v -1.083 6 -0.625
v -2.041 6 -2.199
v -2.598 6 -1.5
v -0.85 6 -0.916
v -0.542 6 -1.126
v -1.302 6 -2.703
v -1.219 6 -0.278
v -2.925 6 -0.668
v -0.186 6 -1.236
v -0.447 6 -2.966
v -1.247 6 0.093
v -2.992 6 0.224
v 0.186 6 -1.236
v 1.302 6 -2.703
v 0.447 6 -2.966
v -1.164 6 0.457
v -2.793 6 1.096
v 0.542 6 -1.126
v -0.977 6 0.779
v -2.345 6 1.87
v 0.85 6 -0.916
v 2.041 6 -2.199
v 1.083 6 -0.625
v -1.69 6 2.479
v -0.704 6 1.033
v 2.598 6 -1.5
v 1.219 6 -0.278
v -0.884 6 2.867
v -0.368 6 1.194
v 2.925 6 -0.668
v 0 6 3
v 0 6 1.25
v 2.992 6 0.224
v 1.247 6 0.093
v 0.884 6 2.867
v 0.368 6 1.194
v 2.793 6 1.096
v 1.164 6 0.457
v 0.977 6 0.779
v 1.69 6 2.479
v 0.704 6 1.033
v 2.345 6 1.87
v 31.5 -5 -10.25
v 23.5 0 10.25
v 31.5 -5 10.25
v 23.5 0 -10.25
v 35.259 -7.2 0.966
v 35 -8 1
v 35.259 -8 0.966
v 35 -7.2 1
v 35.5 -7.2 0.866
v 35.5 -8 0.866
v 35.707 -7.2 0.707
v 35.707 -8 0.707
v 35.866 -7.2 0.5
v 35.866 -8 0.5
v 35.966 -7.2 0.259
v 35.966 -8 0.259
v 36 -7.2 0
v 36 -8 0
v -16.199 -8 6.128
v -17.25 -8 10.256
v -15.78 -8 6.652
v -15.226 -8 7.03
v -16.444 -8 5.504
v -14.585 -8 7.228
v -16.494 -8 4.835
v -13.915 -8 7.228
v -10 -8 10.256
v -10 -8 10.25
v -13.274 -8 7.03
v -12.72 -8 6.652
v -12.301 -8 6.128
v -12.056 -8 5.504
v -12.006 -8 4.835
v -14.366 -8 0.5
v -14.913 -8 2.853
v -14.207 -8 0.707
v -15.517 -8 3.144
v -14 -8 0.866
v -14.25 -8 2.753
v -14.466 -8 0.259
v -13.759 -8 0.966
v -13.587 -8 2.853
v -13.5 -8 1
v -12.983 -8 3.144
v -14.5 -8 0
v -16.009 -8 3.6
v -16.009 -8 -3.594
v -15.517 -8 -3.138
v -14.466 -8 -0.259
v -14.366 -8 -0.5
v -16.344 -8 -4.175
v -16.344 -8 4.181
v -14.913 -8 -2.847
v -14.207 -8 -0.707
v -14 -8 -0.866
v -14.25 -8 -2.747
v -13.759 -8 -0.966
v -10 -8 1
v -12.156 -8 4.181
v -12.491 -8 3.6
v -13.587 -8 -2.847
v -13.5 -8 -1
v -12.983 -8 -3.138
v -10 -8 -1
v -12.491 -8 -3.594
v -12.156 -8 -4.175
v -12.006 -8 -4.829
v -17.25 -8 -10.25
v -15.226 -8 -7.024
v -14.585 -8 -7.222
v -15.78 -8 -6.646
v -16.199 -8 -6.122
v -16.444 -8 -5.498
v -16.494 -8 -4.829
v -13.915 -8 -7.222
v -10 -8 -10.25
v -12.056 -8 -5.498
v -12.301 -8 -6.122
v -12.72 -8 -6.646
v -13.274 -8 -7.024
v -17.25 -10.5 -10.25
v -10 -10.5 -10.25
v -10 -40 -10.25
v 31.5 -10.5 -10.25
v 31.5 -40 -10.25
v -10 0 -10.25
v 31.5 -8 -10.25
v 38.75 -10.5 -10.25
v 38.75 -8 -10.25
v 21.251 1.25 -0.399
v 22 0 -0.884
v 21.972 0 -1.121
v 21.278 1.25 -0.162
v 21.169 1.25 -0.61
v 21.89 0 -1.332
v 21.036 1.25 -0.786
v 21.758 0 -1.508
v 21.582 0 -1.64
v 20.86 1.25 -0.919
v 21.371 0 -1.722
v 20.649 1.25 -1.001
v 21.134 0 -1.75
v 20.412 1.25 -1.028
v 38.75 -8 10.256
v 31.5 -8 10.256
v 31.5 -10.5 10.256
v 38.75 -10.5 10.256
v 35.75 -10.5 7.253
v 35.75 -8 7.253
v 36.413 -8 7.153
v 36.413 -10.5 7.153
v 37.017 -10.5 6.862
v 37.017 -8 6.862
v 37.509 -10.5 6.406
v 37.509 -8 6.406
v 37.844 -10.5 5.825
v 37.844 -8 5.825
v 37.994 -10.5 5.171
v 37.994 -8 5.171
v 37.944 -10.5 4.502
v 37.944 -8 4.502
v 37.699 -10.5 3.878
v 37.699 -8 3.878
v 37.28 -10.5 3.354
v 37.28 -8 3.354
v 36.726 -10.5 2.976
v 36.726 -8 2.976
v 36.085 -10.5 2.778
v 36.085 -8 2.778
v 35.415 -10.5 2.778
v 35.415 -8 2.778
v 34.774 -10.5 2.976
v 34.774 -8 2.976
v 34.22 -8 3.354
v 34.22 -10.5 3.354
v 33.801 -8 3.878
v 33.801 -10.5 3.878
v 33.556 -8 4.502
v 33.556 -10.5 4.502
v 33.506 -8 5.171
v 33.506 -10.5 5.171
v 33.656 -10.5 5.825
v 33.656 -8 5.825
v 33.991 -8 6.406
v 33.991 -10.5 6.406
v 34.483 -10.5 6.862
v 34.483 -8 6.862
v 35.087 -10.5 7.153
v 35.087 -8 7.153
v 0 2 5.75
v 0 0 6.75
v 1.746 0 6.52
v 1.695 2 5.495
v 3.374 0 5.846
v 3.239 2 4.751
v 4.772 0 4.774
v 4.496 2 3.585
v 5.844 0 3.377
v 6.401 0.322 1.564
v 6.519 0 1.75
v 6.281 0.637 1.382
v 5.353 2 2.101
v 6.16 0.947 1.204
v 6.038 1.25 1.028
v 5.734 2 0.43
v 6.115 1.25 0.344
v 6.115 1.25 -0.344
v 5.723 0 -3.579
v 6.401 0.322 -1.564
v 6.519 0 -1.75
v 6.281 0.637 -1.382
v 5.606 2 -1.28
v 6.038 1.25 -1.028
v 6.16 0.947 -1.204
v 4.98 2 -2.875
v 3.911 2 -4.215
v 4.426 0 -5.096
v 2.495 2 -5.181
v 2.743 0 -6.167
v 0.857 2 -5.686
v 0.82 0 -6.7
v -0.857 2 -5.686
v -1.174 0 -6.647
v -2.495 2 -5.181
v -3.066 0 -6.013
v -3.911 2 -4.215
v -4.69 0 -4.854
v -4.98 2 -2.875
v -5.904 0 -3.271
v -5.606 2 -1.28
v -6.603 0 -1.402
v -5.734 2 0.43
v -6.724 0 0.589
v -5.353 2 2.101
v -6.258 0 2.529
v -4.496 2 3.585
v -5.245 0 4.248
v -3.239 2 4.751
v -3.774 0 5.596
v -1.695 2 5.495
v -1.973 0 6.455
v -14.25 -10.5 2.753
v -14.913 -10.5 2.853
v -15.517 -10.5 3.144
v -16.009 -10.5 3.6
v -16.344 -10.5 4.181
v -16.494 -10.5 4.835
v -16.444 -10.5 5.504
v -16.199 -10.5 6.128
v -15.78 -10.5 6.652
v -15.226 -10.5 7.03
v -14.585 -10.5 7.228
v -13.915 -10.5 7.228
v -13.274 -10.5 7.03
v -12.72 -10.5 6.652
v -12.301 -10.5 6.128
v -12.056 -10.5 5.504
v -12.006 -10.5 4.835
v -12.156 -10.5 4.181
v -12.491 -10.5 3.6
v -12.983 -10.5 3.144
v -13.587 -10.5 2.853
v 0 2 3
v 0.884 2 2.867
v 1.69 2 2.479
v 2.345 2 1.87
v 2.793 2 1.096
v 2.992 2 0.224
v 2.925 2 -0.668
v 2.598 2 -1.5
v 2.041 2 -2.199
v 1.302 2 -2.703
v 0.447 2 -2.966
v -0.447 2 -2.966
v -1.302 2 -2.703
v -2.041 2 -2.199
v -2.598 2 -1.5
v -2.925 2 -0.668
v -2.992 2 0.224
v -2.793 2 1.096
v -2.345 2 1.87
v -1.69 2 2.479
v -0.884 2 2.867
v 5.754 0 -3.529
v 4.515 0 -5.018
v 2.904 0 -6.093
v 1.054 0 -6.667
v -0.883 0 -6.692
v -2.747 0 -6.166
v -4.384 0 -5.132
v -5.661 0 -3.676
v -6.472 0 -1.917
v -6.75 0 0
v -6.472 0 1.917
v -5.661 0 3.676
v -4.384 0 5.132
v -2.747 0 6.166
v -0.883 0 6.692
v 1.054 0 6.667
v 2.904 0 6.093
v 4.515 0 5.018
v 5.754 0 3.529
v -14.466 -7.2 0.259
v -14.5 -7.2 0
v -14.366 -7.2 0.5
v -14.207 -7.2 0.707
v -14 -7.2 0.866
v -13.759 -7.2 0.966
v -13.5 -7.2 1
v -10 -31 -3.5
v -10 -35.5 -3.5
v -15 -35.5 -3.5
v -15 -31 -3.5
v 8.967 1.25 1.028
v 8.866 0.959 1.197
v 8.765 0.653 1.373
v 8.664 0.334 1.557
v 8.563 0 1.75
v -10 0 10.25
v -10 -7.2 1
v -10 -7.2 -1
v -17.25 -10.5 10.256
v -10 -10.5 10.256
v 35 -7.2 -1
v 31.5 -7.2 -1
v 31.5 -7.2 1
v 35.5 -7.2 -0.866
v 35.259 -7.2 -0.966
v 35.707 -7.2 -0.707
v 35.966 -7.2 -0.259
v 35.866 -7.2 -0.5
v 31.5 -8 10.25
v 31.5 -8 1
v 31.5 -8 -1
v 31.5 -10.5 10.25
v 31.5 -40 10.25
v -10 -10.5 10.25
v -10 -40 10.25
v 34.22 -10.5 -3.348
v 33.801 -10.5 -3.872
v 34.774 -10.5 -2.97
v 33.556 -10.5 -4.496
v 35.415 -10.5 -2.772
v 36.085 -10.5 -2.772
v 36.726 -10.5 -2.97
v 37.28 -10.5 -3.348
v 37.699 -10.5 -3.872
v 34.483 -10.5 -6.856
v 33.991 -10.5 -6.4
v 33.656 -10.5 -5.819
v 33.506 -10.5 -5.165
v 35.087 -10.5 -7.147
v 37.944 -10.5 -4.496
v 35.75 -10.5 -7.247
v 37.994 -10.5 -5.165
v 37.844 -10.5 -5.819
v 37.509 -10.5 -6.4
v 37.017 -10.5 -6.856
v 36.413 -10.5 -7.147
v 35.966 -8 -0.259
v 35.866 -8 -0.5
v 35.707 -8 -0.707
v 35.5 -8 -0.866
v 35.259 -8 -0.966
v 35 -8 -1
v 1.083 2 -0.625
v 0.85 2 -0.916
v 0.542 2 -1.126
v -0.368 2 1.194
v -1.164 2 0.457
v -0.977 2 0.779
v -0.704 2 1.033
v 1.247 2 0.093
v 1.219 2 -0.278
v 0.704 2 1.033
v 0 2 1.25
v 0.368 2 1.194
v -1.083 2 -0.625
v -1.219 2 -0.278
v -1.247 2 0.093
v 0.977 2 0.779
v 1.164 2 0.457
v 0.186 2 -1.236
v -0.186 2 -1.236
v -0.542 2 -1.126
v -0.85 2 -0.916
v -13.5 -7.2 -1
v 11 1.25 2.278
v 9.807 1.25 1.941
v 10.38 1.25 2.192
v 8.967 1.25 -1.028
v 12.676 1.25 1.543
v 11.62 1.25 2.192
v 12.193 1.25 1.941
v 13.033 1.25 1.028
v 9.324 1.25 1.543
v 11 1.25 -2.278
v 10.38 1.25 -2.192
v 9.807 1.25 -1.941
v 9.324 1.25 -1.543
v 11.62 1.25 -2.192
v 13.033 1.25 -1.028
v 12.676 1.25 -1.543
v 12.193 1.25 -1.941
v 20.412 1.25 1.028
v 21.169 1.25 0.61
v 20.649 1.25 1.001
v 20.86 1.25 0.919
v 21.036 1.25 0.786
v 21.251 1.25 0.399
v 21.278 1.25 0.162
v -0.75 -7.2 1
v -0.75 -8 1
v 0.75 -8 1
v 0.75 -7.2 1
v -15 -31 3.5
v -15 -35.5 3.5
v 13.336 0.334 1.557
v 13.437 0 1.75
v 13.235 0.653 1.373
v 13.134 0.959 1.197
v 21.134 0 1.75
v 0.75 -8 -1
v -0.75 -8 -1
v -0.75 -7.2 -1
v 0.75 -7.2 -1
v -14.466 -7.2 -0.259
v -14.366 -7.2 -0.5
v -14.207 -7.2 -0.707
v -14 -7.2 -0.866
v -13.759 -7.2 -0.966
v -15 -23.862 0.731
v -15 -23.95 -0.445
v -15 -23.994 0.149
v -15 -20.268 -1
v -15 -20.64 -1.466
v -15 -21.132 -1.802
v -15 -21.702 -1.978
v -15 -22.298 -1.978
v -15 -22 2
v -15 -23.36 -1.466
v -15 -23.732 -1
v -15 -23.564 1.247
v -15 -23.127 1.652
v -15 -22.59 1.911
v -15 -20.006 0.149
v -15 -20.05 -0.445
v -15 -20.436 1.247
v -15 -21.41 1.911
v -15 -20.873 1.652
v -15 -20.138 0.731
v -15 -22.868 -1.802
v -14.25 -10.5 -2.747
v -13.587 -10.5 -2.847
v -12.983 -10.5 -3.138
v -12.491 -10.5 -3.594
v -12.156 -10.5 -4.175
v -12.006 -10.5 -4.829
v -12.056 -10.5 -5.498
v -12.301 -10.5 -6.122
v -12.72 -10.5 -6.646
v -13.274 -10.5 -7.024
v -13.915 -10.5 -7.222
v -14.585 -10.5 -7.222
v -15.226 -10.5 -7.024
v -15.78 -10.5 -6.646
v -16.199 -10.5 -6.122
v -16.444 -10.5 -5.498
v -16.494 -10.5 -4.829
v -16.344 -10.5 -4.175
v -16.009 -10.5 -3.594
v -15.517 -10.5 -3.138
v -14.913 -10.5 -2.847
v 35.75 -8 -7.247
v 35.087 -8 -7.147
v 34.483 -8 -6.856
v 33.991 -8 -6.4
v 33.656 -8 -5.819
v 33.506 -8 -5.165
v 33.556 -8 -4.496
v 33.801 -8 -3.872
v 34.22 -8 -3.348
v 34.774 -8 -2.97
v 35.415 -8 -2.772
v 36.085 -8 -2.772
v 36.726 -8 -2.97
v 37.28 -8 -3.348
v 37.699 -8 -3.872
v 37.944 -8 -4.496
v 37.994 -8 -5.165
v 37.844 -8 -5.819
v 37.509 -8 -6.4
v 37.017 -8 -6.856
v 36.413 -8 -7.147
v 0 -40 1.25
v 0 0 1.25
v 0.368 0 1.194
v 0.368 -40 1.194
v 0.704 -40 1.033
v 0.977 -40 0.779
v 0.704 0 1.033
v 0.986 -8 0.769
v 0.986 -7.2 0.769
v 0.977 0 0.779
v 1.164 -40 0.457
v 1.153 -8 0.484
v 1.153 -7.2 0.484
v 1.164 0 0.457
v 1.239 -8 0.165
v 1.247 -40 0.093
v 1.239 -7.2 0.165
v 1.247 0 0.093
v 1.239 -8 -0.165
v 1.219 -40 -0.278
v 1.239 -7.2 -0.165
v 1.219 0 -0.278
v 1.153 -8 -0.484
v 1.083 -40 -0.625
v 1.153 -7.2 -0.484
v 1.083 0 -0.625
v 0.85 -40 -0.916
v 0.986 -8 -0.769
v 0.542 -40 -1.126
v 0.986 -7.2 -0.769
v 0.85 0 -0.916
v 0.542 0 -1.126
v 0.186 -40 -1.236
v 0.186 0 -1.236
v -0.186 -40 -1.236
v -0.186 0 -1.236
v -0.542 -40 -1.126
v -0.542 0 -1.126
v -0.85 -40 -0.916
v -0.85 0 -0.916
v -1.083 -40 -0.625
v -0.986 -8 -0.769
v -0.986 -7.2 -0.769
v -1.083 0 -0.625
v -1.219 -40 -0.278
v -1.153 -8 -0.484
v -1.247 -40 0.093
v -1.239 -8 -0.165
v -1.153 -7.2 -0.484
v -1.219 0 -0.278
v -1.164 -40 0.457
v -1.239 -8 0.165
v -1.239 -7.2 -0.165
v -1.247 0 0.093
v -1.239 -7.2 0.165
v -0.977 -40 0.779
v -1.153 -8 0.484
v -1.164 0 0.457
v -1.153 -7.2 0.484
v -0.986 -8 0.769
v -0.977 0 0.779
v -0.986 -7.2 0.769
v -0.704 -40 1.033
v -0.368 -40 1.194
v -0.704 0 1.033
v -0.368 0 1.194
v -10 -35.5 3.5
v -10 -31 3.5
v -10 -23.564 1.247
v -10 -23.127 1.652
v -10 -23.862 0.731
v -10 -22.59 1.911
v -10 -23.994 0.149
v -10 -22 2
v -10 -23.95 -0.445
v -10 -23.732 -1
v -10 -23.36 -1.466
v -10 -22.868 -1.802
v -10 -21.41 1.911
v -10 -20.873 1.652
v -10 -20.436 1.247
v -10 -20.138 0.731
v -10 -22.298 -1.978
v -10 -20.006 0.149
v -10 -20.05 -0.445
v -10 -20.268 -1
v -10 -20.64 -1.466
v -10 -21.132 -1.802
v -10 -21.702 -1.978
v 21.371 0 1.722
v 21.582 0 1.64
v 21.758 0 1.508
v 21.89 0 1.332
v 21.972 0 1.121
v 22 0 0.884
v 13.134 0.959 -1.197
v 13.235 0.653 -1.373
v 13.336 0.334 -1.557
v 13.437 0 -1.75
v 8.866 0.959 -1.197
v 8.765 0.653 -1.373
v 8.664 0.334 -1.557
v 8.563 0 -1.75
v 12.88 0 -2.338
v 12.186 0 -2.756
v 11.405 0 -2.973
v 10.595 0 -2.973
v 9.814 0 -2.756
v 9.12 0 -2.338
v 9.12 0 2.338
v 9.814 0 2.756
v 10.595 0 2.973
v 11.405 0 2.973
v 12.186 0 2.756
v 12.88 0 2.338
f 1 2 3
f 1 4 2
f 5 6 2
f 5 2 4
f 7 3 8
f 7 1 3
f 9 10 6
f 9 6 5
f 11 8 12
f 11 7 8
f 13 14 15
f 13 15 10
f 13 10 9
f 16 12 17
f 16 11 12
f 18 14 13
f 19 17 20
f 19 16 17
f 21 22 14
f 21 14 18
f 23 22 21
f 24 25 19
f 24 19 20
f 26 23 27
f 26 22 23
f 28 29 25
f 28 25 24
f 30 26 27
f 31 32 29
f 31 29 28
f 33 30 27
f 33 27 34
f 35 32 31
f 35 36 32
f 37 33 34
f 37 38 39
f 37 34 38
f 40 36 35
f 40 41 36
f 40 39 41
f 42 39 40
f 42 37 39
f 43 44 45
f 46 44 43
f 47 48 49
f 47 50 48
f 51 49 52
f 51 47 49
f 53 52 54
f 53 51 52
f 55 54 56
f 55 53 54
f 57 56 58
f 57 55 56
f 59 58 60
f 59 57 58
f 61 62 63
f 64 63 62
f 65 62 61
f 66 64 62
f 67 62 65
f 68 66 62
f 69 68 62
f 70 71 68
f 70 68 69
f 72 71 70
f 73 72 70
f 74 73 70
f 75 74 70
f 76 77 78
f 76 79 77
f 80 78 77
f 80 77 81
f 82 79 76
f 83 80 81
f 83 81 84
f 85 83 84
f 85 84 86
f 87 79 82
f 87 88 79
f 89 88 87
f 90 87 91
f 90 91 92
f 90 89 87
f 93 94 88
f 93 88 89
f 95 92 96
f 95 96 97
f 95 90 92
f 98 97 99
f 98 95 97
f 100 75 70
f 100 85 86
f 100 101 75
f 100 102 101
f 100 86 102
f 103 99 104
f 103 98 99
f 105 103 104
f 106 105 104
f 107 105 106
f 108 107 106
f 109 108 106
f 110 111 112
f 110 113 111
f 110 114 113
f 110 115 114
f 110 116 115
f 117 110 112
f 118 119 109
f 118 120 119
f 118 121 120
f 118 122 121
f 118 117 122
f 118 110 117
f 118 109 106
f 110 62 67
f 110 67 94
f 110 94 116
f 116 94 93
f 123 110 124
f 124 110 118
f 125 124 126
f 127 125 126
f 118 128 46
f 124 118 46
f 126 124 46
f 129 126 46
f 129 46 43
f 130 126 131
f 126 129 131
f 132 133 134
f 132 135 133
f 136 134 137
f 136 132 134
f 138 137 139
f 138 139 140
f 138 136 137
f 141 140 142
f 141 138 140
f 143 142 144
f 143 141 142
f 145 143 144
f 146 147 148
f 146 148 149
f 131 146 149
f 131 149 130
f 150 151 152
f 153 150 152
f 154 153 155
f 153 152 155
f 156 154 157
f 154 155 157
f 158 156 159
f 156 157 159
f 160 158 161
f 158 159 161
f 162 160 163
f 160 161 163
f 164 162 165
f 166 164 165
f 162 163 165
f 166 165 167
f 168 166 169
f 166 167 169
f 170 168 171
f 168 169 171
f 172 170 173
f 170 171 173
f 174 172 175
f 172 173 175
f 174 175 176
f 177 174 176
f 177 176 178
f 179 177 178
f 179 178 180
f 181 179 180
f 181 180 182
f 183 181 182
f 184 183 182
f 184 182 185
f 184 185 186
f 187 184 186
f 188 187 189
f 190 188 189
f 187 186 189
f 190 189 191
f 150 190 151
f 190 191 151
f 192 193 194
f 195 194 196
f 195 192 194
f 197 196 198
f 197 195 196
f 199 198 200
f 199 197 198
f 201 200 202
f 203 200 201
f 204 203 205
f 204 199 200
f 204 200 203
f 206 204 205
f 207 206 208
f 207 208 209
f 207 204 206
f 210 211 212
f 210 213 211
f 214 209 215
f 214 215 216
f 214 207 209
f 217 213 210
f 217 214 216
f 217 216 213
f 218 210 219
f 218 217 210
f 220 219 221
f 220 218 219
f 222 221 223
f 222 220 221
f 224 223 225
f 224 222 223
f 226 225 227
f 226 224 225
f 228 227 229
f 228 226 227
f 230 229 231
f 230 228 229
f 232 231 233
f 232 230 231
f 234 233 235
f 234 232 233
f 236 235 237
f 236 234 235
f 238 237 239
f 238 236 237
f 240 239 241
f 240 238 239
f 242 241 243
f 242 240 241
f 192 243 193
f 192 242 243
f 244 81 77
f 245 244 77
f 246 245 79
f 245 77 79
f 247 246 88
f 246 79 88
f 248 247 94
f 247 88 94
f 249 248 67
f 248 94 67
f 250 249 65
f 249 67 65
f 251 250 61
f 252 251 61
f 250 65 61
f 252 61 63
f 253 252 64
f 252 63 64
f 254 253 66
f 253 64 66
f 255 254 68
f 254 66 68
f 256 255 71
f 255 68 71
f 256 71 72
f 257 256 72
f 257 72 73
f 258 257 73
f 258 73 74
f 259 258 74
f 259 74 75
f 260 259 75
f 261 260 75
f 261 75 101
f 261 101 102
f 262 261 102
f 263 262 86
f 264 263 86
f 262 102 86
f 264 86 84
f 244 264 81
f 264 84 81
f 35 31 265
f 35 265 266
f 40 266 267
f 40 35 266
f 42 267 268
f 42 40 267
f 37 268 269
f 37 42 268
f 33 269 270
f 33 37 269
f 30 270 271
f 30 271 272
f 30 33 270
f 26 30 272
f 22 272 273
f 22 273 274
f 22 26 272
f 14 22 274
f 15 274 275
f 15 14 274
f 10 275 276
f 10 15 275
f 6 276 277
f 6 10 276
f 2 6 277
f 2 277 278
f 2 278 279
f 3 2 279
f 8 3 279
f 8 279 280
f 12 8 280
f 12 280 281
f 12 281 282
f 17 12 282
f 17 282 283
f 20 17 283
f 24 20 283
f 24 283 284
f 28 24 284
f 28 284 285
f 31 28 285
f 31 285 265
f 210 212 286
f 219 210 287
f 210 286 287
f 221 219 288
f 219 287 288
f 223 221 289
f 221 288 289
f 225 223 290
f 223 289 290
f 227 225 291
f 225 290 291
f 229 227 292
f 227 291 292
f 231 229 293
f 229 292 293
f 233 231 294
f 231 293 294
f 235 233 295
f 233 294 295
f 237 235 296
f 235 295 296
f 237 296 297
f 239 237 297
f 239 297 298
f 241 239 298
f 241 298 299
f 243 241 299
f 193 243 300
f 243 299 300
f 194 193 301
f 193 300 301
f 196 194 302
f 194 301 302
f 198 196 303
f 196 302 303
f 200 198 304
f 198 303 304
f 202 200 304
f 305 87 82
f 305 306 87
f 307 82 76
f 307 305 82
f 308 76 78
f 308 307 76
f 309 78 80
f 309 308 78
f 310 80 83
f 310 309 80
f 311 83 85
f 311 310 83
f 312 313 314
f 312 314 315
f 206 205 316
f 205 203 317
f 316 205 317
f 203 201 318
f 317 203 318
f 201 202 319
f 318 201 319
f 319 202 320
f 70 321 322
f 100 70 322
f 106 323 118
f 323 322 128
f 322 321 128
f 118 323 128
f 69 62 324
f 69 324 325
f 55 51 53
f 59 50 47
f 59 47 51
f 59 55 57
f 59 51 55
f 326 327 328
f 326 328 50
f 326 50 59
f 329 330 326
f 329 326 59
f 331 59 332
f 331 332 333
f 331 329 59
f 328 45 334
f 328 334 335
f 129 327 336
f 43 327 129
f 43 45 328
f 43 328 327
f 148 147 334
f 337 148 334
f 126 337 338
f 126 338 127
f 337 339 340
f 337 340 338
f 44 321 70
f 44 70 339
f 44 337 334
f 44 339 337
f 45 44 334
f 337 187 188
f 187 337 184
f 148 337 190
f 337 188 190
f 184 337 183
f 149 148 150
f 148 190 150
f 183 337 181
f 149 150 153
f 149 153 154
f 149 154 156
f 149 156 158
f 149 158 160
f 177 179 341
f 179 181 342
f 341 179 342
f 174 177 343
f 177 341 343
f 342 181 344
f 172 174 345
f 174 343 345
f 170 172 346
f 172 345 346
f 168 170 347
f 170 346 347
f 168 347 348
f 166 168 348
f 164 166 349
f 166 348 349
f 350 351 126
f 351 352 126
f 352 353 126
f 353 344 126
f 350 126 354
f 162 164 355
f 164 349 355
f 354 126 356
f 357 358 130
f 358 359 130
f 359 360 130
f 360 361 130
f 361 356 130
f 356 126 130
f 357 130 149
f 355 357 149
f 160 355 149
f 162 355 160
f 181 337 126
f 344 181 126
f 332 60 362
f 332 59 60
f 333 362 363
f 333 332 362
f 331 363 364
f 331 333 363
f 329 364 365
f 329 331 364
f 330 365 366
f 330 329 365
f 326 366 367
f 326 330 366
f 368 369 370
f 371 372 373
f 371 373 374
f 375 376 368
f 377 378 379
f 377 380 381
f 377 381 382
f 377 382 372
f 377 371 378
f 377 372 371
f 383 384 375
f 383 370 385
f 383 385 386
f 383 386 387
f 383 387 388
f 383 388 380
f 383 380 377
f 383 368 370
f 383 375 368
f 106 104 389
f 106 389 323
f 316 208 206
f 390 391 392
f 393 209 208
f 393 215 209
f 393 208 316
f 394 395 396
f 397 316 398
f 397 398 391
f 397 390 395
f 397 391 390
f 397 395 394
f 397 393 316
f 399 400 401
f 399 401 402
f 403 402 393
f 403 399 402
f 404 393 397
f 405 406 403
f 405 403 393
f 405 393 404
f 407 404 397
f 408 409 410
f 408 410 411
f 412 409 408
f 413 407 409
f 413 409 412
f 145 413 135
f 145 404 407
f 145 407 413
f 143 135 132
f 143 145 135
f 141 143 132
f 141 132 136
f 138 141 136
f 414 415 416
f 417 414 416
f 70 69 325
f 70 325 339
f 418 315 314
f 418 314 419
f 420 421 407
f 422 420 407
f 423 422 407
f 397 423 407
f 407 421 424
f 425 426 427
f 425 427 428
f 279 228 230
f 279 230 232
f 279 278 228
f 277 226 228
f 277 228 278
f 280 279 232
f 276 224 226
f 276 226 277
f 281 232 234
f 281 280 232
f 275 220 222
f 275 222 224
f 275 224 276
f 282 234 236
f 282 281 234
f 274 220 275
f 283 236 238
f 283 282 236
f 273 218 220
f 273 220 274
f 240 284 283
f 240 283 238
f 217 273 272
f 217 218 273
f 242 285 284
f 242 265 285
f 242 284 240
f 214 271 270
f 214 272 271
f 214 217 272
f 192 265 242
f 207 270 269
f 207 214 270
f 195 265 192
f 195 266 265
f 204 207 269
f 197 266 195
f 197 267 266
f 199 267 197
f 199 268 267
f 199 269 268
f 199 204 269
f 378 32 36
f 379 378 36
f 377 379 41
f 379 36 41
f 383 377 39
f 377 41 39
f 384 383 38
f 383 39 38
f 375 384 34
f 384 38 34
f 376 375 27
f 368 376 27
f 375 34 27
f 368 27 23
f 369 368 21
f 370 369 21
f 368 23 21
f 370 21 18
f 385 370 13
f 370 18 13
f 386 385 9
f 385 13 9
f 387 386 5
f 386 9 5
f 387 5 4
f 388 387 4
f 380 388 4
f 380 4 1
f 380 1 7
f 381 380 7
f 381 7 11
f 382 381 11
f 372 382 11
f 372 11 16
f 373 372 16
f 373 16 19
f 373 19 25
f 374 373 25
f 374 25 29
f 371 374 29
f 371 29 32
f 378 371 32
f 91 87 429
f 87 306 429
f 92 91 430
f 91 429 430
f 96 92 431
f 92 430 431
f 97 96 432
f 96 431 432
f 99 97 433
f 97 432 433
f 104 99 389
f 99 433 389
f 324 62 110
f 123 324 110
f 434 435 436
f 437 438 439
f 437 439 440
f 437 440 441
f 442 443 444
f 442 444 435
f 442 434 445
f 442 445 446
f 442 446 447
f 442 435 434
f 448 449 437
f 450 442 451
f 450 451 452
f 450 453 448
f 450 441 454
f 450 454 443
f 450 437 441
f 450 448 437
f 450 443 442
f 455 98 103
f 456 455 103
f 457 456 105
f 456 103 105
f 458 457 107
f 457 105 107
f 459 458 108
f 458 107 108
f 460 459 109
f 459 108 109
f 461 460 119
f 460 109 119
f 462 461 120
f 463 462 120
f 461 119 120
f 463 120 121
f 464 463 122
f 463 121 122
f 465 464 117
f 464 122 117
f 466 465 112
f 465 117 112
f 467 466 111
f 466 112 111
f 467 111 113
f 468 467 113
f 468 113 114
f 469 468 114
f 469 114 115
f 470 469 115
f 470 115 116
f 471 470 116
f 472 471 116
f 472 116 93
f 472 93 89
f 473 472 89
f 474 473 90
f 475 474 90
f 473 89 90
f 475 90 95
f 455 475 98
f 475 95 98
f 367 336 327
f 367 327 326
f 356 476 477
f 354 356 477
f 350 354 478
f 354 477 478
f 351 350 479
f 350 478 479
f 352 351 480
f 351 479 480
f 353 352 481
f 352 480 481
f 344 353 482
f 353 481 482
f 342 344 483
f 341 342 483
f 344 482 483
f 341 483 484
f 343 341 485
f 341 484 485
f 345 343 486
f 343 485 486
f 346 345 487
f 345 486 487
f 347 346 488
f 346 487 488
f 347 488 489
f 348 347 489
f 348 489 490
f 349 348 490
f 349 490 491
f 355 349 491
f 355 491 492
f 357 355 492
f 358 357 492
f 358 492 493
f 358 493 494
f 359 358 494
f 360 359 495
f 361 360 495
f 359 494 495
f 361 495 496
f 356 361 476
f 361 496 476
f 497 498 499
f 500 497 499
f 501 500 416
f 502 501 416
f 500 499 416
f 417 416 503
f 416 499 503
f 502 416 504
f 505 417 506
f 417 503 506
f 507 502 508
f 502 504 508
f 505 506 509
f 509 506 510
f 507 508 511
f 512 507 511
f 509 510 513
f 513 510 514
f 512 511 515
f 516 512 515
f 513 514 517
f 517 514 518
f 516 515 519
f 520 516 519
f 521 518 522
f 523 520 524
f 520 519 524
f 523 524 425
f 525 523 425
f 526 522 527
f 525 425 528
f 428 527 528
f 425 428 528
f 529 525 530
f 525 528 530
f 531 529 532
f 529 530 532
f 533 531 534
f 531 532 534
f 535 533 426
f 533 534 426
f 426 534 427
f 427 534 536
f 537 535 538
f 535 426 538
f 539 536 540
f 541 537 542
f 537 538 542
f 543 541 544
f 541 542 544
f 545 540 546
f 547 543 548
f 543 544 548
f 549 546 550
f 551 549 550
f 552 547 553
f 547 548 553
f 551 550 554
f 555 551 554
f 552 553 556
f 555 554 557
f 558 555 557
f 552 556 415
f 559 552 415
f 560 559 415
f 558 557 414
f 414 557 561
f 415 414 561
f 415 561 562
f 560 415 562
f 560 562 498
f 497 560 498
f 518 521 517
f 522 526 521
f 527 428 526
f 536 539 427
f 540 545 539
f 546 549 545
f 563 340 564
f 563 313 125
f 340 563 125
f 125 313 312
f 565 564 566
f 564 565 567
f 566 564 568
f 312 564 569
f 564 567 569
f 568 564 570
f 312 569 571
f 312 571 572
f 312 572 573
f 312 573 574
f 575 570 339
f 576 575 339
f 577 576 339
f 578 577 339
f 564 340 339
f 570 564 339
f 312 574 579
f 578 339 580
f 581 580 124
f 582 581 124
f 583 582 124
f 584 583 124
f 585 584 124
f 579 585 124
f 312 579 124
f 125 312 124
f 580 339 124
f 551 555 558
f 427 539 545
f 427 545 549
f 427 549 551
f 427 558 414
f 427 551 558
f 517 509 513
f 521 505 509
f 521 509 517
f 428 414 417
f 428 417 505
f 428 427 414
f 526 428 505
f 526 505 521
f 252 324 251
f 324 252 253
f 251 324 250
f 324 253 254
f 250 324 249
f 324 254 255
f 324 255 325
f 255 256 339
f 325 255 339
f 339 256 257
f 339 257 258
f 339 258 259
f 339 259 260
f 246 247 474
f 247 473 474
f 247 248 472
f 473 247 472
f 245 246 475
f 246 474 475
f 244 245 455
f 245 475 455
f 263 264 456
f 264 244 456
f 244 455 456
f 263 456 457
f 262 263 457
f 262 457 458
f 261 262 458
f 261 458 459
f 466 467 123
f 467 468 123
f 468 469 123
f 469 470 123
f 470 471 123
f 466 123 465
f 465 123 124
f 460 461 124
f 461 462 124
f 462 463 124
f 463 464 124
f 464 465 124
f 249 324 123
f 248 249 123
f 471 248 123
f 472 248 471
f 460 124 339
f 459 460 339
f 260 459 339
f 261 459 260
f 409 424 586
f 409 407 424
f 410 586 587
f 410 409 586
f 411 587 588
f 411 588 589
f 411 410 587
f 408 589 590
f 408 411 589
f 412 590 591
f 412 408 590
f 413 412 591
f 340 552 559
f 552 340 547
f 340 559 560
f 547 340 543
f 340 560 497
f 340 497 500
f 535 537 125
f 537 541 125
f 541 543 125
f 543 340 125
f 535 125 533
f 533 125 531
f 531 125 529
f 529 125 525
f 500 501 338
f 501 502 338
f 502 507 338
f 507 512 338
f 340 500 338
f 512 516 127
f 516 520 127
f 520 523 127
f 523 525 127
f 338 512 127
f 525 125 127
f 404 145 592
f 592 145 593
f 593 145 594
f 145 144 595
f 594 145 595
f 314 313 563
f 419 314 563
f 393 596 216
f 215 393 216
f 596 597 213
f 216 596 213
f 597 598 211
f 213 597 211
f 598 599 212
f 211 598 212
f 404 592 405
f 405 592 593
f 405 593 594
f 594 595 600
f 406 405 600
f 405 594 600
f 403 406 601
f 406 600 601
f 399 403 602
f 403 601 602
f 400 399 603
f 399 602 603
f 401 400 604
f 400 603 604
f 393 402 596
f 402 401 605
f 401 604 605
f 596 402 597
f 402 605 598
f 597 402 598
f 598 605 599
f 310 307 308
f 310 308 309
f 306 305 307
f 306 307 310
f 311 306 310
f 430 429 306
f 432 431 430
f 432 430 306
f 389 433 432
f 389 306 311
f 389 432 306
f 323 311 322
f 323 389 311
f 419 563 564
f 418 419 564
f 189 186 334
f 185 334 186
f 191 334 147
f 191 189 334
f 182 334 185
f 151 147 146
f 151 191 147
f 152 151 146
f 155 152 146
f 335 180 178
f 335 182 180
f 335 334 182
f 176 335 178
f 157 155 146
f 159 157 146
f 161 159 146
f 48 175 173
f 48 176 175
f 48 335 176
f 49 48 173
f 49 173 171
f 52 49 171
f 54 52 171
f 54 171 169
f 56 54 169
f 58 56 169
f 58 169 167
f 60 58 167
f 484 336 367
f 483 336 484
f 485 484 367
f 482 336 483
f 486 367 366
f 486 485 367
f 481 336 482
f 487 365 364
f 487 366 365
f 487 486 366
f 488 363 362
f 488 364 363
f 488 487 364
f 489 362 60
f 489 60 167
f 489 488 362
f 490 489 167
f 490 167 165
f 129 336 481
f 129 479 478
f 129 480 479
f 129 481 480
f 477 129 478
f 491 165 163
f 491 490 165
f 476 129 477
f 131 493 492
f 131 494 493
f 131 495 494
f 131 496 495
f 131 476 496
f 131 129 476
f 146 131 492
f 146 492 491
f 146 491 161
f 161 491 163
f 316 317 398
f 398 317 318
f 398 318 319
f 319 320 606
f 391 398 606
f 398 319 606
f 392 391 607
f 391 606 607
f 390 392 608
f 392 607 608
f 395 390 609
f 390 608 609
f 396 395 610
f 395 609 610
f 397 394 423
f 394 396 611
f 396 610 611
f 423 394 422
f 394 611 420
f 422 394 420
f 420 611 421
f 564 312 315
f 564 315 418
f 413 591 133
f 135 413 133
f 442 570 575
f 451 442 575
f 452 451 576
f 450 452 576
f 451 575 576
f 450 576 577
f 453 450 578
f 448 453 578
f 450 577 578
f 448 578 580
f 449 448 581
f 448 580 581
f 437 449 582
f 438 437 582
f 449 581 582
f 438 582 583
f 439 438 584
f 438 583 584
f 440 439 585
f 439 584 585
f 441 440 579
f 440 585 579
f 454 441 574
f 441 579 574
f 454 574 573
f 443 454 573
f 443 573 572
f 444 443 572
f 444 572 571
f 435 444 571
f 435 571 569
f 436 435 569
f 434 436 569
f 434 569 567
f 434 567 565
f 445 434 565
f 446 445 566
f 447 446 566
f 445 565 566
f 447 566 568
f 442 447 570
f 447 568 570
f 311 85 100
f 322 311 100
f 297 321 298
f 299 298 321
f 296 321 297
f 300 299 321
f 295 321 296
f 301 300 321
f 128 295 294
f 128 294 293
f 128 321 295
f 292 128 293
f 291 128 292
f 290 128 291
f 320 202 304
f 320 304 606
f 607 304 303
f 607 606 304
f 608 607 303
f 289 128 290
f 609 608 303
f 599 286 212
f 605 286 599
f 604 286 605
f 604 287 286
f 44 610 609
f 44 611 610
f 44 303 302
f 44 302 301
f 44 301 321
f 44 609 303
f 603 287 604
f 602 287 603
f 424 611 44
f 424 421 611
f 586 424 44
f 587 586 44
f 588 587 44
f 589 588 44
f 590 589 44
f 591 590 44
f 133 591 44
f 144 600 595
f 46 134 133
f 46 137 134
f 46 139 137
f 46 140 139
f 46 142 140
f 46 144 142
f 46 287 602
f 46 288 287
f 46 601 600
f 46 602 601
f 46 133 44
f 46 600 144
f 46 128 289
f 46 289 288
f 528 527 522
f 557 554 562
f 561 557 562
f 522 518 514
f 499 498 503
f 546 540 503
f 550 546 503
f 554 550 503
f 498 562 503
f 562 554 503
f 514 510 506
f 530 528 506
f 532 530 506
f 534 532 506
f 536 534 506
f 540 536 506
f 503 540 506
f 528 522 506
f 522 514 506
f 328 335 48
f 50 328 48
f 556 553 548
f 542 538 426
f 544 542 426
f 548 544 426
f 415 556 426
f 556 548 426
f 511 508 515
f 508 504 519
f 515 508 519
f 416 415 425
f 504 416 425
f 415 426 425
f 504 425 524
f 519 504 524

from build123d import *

# Parameters (mm, degrees)
SKETCH1_W           = 41.5
SKETCH1_H           = 20.5
SKETCH1_R           = 1.25
BOSS_EXTRUDE1_DEPTH = 40
CHAMFER1_SIZE       = 5
CHAMFER1_SIZE2      = 8
SKETCH2_W           = 7.25
SKETCH2_H           = 20.506105109
SKETCH2_R           = 2.25
BOSS_EXTRUDE2_DEPTH = 2.5
SKETCH3_W           = 50.5
SKETCH3_H           = 2
BOSS_EXTRUDE3_DEPTH = 0.8
FILLET1_R           = 1
SKETCH4_R           = 6.75
BOSS_EXTRUDE4_DEPTH = 2
CHAMFER2_SIZE2      = 1
CHAMFER2_SIZE       = 2
BOSS_EXTRUDE5_DEPTH = 1.25
BOSS_EXTRUDE5_DRAFT = 30
FILLET2_R           = 1
BOSS_EXTRUDE6_START = 6
SKETCH6_R           = 3
SKETCH6_R_2         = 1.25
BOSS_EXTRUDE6_DEPTH = 6
SKETCH7_R           = 2
SKETCH7_W           = 7
SKETCH7_H           = 4.5
BOSS_EXTRUDE7_DEPTH = 5


with BuildPart() as part:
    # Sketch1 → Boss-Extrude1 (new body)
    with BuildSketch(Plane(origin=(0, 0, 0), x_dir=(1, 0, 0), z_dir=(0, 1, 0))):
        with Locations((10.75, 0)):
            Rectangle(SKETCH1_W, SKETCH1_H)
        with Locations(Location((0, 0, 0), (0, 0, 270))):
            Circle(SKETCH1_R, mode=Mode.SUBTRACT)
    extrude(amount=-BOSS_EXTRUDE1_DEPTH)

    # Chamfer1
    chamfer1_edges = [part.edges().sort_by_distance(p)[0] for p in [
        (31.5, 0, 0),
    ]]
    chamfer1_side = [part.faces().sort_by_distance(p)[0] for p in [
        (31.5, -20, 0),
    ]]
    chamfer(chamfer1_edges, length=CHAMFER1_SIZE, length2=CHAMFER1_SIZE2, reference=chamfer1_side[0])

    # Sketch2 → Boss-Extrude2 (add)
    # profile 1 of 2: a face of its own
    with BuildSketch(Plane(origin=(0, -8, 0), x_dir=(1, 0, 0), z_dir=(0, 1, 0))):
        with Locations((-13.625, -0.003052554)):
            Rectangle(SKETCH2_W, SKETCH2_H)
        with Locations(Location((-14.25, 4.996947445, 0), (0, 0, 270))):
            Circle(SKETCH2_R, mode=Mode.SUBTRACT)
        with Locations(Location((-14.25, -5.003052555, 0), (0, 0, 90))):
            Circle(SKETCH2_R, mode=Mode.SUBTRACT)
    # profile 2 of 2: a face of its own
    with BuildSketch(Plane(origin=(0, -8, 0), x_dir=(1, 0, 0), z_dir=(0, 1, 0))):
        with Locations((35.125, -0.003052554)):
            Rectangle(SKETCH2_W, SKETCH2_H)
        with Locations(Location((35.75, 4.996947445, 0), (0, 0, 90))):
            Circle(SKETCH2_R, mode=Mode.SUBTRACT)
        with Locations(Location((35.75, -5.003052555, 0), (0, 0, 270))):
            Circle(SKETCH2_R, mode=Mode.SUBTRACT)
    extrude(amount=-BOSS_EXTRUDE2_DEPTH)

    # Sketch3 → Boss-Extrude3 (add)
    with BuildSketch(Plane(origin=(0, -8, 0), x_dir=(1, 0, 0), z_dir=(0, 1, 0))):
        with Locations((10.75, 0)):
            Rectangle(SKETCH3_W, SKETCH3_H)
    extrude(amount=BOSS_EXTRUDE3_DEPTH)

    # Fillet1
    fillet1_edges = [part.edges().sort_by_distance(p)[0] for p in [
        (36, -7.6, 1),
        (36, -7.6, -1),
        (-14.5, -7.6, -1),
        (-14.5, -7.6, 1),
    ]]
    fillet(fillet1_edges, radius=FILLET1_R - 0.0001)  # a hair under: the kernel refuses the full size

    # Sketch4 → Boss-Extrude4 (add)
    with BuildSketch(Plane(origin=(0, 0, 0), x_dir=(1, 0, 0), z_dir=(0, 1, 0))):
        with Locations(Location((0, 0, 0), (0, 0, 270))):
            Circle(SKETCH4_R)
    extrude(amount=BOSS_EXTRUDE4_DEPTH)

    # Chamfer2
    chamfer2_edges = [part.edges().sort_by_distance(p)[0] for p in [
        (0, 2, -6.75),
    ]]
    chamfer2_side = [part.faces().sort_by_distance(p)[0] for p in [
        (0, 1.98, -6.75),
    ]]
    chamfer(chamfer2_edges, length=CHAMFER2_SIZE - 0.0001, length2=CHAMFER2_SIZE2 - 0.0001, reference=chamfer2_side[0])  # a hair under: the kernel refuses the full size


with BuildPart() as boss_extrude5_tool:
    # Sketch5 → Boss-Extrude5 (with draft: the straight prism first)
    with BuildSketch(Plane(origin=(0, 0, 0), x_dir=(1, 0, 0), z_dir=(0, 1, 0))):
        with BuildLine():
            ThreePointArc((13.436698586, 1.75), (11, 3), (8.563301414, 1.75))
            Line((8.563301414, 1.75), (2.982880946, 1.75))
            Line((2.982880946, 1.75), (2.982880946, -1.75))
            Line((2.982880946, -1.75), (8.563301414, -1.75))
            ThreePointArc((8.563301414, -1.75), (11, -3), (13.436698586, -1.75))
            Line((13.436698586, -1.75), (22, -1.75))
            Line((22, -1.75), (22, 1.75))
            Line((22, 1.75), (13.436698586, 1.75))
        make_face()
    extrude(amount=BOSS_EXTRUDE5_DEPTH)
    # Boss-Extrude5: the draft: its side faces are tilted about the plane it starts from
    boss_extrude5_sides = [boss_extrude5_tool.faces().sort_by_distance(p)[0] for p in [
        (11, 0.625, -3),
        (5.77309118, 0.625, -1.75),
        (2.982880946, 0.625, 0),
        (5.77309118, 0.625, 1.75),
        (11, 0.625, 3),
        (17.718349293, 0.625, 1.75),
        (22, 0.625, 0),
        (17.718349293, 0.625, -1.75),
    ]]
    draft(boss_extrude5_sides, Plane(origin=(0, 0, 0), x_dir=(1, 0, 0), z_dir=(0, 1, 0)), BOSS_EXTRUDE5_DRAFT)


with BuildPart() as part_1:
    add(part.part)

    # Boss-Extrude5: add boss_extrude5_tool
    add(boss_extrude5_tool.part)

    # Fillet2
    fillet2_edges = [part_1.edges().sort_by_distance(p)[0] for p in [
        (21.639156082, 0.625, 1.389156082),
        (21.639156082, 0.625, -1.389156082),
    ]]
    fillet(fillet2_edges, radius=FILLET2_R)

    # Sketch6 → Boss-Extrude6 (add)
    with BuildSketch(Plane(origin=(0, 0, 0), x_dir=(1, 0, 0), z_dir=(0, 1, 0)).offset(BOSS_EXTRUDE6_START)):
        with Locations(Location((0, 0, 0), (0, 0, 270))):
            Circle(SKETCH6_R)
        with Locations(Location((0, 0, 0), (0, 0, 270))):
            Circle(SKETCH6_R_2, mode=Mode.SUBTRACT)
    extrude(amount=-BOSS_EXTRUDE6_DEPTH)

    # Sketch7 → Boss-Extrude7 (add)
    with BuildSketch(Plane.ZY.offset(10)):
        with Locations((0, -22)):
            Circle(SKETCH7_R)
        with Locations((0, -33.25)):
            Rectangle(SKETCH7_W, SKETCH7_H)
    extrude(amount=BOSS_EXTRUDE7_DEPTH)


solid = part_1.part
